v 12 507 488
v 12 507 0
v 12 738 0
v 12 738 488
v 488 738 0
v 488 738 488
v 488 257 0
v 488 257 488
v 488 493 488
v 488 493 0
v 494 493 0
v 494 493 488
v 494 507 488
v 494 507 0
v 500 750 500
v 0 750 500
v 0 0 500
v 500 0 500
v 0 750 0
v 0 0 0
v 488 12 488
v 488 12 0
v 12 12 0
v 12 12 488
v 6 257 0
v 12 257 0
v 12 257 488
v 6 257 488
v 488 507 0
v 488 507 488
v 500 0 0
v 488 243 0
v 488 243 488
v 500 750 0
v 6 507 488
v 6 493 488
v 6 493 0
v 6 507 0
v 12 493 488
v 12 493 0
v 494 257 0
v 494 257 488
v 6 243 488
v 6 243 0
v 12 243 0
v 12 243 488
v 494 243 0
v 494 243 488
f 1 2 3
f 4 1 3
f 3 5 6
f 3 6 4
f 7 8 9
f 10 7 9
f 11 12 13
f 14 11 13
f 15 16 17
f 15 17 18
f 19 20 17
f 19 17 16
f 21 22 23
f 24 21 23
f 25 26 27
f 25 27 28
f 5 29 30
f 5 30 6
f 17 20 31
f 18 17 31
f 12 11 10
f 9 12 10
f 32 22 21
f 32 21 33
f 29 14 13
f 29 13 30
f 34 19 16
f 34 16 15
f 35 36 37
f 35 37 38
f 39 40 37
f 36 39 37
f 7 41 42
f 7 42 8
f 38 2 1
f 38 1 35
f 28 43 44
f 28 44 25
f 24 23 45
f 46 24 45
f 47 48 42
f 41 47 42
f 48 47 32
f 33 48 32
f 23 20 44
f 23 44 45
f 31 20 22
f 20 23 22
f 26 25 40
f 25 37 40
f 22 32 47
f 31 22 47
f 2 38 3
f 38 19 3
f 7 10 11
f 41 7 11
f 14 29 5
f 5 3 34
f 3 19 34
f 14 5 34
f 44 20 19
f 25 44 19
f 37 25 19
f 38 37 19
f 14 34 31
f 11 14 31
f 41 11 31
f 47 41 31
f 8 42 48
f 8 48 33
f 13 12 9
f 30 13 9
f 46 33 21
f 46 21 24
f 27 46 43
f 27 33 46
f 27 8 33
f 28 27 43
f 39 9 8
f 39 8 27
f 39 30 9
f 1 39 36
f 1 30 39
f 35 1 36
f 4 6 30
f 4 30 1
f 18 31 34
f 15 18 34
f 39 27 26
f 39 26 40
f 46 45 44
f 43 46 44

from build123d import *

# Parameters (mm, degrees)
SKETCH1_W           = 500
SKETCH1_H           = 750
BOSS_EXTRUDE1_DEPTH = 500
SKETCH2_W           = 476
SKETCH2_H           = 726
CUT_EXTRUDE1_DEPTH  = 488
SKETCH3_W           = 6
SKETCH3_H           = 14
CUT_EXTRUDE2_DEPTH  = 488


with BuildPart() as part:
    # Sketch1 → Boss-Extrude1 (new body)
    with BuildSketch(Plane.XY):
        with Locations((250, 375)):
            Rectangle(SKETCH1_W, SKETCH1_H)
    extrude(amount=BOSS_EXTRUDE1_DEPTH)

    # Sketch2 → Cut-Extrude1 (cut)
    with BuildSketch(Plane(origin=(0, 0, 0), x_dir=(-1, 0, 0), z_dir=(0, 0, -1))):
        with Locations((-250, 375)):
            Rectangle(SKETCH2_W, SKETCH2_H)
    extrude(amount=-CUT_EXTRUDE1_DEPTH, mode=Mode.SUBTRACT)

    # Sketch3 → Cut-Extrude2 (cut)
    with BuildSketch(Plane(origin=(0, 0, 0), x_dir=(-1, 0, 0), z_dir=(0, 0, -1))):
        with Locations((-491, 250)):
            Rectangle(SKETCH3_W, SKETCH3_H)
        with Locations((-491, 500)):
            Rectangle(SKETCH3_W, SKETCH3_H)
        with Locations((-9, 500)):
            Rectangle(SKETCH3_W, SKETCH3_H)
        with Locations((-9, 250)):
            Rectangle(SKETCH3_W, SKETCH3_H)
    extrude(amount=-CUT_EXTRUDE2_DEPTH, mode=Mode.SUBTRACT)


solid = part.part
